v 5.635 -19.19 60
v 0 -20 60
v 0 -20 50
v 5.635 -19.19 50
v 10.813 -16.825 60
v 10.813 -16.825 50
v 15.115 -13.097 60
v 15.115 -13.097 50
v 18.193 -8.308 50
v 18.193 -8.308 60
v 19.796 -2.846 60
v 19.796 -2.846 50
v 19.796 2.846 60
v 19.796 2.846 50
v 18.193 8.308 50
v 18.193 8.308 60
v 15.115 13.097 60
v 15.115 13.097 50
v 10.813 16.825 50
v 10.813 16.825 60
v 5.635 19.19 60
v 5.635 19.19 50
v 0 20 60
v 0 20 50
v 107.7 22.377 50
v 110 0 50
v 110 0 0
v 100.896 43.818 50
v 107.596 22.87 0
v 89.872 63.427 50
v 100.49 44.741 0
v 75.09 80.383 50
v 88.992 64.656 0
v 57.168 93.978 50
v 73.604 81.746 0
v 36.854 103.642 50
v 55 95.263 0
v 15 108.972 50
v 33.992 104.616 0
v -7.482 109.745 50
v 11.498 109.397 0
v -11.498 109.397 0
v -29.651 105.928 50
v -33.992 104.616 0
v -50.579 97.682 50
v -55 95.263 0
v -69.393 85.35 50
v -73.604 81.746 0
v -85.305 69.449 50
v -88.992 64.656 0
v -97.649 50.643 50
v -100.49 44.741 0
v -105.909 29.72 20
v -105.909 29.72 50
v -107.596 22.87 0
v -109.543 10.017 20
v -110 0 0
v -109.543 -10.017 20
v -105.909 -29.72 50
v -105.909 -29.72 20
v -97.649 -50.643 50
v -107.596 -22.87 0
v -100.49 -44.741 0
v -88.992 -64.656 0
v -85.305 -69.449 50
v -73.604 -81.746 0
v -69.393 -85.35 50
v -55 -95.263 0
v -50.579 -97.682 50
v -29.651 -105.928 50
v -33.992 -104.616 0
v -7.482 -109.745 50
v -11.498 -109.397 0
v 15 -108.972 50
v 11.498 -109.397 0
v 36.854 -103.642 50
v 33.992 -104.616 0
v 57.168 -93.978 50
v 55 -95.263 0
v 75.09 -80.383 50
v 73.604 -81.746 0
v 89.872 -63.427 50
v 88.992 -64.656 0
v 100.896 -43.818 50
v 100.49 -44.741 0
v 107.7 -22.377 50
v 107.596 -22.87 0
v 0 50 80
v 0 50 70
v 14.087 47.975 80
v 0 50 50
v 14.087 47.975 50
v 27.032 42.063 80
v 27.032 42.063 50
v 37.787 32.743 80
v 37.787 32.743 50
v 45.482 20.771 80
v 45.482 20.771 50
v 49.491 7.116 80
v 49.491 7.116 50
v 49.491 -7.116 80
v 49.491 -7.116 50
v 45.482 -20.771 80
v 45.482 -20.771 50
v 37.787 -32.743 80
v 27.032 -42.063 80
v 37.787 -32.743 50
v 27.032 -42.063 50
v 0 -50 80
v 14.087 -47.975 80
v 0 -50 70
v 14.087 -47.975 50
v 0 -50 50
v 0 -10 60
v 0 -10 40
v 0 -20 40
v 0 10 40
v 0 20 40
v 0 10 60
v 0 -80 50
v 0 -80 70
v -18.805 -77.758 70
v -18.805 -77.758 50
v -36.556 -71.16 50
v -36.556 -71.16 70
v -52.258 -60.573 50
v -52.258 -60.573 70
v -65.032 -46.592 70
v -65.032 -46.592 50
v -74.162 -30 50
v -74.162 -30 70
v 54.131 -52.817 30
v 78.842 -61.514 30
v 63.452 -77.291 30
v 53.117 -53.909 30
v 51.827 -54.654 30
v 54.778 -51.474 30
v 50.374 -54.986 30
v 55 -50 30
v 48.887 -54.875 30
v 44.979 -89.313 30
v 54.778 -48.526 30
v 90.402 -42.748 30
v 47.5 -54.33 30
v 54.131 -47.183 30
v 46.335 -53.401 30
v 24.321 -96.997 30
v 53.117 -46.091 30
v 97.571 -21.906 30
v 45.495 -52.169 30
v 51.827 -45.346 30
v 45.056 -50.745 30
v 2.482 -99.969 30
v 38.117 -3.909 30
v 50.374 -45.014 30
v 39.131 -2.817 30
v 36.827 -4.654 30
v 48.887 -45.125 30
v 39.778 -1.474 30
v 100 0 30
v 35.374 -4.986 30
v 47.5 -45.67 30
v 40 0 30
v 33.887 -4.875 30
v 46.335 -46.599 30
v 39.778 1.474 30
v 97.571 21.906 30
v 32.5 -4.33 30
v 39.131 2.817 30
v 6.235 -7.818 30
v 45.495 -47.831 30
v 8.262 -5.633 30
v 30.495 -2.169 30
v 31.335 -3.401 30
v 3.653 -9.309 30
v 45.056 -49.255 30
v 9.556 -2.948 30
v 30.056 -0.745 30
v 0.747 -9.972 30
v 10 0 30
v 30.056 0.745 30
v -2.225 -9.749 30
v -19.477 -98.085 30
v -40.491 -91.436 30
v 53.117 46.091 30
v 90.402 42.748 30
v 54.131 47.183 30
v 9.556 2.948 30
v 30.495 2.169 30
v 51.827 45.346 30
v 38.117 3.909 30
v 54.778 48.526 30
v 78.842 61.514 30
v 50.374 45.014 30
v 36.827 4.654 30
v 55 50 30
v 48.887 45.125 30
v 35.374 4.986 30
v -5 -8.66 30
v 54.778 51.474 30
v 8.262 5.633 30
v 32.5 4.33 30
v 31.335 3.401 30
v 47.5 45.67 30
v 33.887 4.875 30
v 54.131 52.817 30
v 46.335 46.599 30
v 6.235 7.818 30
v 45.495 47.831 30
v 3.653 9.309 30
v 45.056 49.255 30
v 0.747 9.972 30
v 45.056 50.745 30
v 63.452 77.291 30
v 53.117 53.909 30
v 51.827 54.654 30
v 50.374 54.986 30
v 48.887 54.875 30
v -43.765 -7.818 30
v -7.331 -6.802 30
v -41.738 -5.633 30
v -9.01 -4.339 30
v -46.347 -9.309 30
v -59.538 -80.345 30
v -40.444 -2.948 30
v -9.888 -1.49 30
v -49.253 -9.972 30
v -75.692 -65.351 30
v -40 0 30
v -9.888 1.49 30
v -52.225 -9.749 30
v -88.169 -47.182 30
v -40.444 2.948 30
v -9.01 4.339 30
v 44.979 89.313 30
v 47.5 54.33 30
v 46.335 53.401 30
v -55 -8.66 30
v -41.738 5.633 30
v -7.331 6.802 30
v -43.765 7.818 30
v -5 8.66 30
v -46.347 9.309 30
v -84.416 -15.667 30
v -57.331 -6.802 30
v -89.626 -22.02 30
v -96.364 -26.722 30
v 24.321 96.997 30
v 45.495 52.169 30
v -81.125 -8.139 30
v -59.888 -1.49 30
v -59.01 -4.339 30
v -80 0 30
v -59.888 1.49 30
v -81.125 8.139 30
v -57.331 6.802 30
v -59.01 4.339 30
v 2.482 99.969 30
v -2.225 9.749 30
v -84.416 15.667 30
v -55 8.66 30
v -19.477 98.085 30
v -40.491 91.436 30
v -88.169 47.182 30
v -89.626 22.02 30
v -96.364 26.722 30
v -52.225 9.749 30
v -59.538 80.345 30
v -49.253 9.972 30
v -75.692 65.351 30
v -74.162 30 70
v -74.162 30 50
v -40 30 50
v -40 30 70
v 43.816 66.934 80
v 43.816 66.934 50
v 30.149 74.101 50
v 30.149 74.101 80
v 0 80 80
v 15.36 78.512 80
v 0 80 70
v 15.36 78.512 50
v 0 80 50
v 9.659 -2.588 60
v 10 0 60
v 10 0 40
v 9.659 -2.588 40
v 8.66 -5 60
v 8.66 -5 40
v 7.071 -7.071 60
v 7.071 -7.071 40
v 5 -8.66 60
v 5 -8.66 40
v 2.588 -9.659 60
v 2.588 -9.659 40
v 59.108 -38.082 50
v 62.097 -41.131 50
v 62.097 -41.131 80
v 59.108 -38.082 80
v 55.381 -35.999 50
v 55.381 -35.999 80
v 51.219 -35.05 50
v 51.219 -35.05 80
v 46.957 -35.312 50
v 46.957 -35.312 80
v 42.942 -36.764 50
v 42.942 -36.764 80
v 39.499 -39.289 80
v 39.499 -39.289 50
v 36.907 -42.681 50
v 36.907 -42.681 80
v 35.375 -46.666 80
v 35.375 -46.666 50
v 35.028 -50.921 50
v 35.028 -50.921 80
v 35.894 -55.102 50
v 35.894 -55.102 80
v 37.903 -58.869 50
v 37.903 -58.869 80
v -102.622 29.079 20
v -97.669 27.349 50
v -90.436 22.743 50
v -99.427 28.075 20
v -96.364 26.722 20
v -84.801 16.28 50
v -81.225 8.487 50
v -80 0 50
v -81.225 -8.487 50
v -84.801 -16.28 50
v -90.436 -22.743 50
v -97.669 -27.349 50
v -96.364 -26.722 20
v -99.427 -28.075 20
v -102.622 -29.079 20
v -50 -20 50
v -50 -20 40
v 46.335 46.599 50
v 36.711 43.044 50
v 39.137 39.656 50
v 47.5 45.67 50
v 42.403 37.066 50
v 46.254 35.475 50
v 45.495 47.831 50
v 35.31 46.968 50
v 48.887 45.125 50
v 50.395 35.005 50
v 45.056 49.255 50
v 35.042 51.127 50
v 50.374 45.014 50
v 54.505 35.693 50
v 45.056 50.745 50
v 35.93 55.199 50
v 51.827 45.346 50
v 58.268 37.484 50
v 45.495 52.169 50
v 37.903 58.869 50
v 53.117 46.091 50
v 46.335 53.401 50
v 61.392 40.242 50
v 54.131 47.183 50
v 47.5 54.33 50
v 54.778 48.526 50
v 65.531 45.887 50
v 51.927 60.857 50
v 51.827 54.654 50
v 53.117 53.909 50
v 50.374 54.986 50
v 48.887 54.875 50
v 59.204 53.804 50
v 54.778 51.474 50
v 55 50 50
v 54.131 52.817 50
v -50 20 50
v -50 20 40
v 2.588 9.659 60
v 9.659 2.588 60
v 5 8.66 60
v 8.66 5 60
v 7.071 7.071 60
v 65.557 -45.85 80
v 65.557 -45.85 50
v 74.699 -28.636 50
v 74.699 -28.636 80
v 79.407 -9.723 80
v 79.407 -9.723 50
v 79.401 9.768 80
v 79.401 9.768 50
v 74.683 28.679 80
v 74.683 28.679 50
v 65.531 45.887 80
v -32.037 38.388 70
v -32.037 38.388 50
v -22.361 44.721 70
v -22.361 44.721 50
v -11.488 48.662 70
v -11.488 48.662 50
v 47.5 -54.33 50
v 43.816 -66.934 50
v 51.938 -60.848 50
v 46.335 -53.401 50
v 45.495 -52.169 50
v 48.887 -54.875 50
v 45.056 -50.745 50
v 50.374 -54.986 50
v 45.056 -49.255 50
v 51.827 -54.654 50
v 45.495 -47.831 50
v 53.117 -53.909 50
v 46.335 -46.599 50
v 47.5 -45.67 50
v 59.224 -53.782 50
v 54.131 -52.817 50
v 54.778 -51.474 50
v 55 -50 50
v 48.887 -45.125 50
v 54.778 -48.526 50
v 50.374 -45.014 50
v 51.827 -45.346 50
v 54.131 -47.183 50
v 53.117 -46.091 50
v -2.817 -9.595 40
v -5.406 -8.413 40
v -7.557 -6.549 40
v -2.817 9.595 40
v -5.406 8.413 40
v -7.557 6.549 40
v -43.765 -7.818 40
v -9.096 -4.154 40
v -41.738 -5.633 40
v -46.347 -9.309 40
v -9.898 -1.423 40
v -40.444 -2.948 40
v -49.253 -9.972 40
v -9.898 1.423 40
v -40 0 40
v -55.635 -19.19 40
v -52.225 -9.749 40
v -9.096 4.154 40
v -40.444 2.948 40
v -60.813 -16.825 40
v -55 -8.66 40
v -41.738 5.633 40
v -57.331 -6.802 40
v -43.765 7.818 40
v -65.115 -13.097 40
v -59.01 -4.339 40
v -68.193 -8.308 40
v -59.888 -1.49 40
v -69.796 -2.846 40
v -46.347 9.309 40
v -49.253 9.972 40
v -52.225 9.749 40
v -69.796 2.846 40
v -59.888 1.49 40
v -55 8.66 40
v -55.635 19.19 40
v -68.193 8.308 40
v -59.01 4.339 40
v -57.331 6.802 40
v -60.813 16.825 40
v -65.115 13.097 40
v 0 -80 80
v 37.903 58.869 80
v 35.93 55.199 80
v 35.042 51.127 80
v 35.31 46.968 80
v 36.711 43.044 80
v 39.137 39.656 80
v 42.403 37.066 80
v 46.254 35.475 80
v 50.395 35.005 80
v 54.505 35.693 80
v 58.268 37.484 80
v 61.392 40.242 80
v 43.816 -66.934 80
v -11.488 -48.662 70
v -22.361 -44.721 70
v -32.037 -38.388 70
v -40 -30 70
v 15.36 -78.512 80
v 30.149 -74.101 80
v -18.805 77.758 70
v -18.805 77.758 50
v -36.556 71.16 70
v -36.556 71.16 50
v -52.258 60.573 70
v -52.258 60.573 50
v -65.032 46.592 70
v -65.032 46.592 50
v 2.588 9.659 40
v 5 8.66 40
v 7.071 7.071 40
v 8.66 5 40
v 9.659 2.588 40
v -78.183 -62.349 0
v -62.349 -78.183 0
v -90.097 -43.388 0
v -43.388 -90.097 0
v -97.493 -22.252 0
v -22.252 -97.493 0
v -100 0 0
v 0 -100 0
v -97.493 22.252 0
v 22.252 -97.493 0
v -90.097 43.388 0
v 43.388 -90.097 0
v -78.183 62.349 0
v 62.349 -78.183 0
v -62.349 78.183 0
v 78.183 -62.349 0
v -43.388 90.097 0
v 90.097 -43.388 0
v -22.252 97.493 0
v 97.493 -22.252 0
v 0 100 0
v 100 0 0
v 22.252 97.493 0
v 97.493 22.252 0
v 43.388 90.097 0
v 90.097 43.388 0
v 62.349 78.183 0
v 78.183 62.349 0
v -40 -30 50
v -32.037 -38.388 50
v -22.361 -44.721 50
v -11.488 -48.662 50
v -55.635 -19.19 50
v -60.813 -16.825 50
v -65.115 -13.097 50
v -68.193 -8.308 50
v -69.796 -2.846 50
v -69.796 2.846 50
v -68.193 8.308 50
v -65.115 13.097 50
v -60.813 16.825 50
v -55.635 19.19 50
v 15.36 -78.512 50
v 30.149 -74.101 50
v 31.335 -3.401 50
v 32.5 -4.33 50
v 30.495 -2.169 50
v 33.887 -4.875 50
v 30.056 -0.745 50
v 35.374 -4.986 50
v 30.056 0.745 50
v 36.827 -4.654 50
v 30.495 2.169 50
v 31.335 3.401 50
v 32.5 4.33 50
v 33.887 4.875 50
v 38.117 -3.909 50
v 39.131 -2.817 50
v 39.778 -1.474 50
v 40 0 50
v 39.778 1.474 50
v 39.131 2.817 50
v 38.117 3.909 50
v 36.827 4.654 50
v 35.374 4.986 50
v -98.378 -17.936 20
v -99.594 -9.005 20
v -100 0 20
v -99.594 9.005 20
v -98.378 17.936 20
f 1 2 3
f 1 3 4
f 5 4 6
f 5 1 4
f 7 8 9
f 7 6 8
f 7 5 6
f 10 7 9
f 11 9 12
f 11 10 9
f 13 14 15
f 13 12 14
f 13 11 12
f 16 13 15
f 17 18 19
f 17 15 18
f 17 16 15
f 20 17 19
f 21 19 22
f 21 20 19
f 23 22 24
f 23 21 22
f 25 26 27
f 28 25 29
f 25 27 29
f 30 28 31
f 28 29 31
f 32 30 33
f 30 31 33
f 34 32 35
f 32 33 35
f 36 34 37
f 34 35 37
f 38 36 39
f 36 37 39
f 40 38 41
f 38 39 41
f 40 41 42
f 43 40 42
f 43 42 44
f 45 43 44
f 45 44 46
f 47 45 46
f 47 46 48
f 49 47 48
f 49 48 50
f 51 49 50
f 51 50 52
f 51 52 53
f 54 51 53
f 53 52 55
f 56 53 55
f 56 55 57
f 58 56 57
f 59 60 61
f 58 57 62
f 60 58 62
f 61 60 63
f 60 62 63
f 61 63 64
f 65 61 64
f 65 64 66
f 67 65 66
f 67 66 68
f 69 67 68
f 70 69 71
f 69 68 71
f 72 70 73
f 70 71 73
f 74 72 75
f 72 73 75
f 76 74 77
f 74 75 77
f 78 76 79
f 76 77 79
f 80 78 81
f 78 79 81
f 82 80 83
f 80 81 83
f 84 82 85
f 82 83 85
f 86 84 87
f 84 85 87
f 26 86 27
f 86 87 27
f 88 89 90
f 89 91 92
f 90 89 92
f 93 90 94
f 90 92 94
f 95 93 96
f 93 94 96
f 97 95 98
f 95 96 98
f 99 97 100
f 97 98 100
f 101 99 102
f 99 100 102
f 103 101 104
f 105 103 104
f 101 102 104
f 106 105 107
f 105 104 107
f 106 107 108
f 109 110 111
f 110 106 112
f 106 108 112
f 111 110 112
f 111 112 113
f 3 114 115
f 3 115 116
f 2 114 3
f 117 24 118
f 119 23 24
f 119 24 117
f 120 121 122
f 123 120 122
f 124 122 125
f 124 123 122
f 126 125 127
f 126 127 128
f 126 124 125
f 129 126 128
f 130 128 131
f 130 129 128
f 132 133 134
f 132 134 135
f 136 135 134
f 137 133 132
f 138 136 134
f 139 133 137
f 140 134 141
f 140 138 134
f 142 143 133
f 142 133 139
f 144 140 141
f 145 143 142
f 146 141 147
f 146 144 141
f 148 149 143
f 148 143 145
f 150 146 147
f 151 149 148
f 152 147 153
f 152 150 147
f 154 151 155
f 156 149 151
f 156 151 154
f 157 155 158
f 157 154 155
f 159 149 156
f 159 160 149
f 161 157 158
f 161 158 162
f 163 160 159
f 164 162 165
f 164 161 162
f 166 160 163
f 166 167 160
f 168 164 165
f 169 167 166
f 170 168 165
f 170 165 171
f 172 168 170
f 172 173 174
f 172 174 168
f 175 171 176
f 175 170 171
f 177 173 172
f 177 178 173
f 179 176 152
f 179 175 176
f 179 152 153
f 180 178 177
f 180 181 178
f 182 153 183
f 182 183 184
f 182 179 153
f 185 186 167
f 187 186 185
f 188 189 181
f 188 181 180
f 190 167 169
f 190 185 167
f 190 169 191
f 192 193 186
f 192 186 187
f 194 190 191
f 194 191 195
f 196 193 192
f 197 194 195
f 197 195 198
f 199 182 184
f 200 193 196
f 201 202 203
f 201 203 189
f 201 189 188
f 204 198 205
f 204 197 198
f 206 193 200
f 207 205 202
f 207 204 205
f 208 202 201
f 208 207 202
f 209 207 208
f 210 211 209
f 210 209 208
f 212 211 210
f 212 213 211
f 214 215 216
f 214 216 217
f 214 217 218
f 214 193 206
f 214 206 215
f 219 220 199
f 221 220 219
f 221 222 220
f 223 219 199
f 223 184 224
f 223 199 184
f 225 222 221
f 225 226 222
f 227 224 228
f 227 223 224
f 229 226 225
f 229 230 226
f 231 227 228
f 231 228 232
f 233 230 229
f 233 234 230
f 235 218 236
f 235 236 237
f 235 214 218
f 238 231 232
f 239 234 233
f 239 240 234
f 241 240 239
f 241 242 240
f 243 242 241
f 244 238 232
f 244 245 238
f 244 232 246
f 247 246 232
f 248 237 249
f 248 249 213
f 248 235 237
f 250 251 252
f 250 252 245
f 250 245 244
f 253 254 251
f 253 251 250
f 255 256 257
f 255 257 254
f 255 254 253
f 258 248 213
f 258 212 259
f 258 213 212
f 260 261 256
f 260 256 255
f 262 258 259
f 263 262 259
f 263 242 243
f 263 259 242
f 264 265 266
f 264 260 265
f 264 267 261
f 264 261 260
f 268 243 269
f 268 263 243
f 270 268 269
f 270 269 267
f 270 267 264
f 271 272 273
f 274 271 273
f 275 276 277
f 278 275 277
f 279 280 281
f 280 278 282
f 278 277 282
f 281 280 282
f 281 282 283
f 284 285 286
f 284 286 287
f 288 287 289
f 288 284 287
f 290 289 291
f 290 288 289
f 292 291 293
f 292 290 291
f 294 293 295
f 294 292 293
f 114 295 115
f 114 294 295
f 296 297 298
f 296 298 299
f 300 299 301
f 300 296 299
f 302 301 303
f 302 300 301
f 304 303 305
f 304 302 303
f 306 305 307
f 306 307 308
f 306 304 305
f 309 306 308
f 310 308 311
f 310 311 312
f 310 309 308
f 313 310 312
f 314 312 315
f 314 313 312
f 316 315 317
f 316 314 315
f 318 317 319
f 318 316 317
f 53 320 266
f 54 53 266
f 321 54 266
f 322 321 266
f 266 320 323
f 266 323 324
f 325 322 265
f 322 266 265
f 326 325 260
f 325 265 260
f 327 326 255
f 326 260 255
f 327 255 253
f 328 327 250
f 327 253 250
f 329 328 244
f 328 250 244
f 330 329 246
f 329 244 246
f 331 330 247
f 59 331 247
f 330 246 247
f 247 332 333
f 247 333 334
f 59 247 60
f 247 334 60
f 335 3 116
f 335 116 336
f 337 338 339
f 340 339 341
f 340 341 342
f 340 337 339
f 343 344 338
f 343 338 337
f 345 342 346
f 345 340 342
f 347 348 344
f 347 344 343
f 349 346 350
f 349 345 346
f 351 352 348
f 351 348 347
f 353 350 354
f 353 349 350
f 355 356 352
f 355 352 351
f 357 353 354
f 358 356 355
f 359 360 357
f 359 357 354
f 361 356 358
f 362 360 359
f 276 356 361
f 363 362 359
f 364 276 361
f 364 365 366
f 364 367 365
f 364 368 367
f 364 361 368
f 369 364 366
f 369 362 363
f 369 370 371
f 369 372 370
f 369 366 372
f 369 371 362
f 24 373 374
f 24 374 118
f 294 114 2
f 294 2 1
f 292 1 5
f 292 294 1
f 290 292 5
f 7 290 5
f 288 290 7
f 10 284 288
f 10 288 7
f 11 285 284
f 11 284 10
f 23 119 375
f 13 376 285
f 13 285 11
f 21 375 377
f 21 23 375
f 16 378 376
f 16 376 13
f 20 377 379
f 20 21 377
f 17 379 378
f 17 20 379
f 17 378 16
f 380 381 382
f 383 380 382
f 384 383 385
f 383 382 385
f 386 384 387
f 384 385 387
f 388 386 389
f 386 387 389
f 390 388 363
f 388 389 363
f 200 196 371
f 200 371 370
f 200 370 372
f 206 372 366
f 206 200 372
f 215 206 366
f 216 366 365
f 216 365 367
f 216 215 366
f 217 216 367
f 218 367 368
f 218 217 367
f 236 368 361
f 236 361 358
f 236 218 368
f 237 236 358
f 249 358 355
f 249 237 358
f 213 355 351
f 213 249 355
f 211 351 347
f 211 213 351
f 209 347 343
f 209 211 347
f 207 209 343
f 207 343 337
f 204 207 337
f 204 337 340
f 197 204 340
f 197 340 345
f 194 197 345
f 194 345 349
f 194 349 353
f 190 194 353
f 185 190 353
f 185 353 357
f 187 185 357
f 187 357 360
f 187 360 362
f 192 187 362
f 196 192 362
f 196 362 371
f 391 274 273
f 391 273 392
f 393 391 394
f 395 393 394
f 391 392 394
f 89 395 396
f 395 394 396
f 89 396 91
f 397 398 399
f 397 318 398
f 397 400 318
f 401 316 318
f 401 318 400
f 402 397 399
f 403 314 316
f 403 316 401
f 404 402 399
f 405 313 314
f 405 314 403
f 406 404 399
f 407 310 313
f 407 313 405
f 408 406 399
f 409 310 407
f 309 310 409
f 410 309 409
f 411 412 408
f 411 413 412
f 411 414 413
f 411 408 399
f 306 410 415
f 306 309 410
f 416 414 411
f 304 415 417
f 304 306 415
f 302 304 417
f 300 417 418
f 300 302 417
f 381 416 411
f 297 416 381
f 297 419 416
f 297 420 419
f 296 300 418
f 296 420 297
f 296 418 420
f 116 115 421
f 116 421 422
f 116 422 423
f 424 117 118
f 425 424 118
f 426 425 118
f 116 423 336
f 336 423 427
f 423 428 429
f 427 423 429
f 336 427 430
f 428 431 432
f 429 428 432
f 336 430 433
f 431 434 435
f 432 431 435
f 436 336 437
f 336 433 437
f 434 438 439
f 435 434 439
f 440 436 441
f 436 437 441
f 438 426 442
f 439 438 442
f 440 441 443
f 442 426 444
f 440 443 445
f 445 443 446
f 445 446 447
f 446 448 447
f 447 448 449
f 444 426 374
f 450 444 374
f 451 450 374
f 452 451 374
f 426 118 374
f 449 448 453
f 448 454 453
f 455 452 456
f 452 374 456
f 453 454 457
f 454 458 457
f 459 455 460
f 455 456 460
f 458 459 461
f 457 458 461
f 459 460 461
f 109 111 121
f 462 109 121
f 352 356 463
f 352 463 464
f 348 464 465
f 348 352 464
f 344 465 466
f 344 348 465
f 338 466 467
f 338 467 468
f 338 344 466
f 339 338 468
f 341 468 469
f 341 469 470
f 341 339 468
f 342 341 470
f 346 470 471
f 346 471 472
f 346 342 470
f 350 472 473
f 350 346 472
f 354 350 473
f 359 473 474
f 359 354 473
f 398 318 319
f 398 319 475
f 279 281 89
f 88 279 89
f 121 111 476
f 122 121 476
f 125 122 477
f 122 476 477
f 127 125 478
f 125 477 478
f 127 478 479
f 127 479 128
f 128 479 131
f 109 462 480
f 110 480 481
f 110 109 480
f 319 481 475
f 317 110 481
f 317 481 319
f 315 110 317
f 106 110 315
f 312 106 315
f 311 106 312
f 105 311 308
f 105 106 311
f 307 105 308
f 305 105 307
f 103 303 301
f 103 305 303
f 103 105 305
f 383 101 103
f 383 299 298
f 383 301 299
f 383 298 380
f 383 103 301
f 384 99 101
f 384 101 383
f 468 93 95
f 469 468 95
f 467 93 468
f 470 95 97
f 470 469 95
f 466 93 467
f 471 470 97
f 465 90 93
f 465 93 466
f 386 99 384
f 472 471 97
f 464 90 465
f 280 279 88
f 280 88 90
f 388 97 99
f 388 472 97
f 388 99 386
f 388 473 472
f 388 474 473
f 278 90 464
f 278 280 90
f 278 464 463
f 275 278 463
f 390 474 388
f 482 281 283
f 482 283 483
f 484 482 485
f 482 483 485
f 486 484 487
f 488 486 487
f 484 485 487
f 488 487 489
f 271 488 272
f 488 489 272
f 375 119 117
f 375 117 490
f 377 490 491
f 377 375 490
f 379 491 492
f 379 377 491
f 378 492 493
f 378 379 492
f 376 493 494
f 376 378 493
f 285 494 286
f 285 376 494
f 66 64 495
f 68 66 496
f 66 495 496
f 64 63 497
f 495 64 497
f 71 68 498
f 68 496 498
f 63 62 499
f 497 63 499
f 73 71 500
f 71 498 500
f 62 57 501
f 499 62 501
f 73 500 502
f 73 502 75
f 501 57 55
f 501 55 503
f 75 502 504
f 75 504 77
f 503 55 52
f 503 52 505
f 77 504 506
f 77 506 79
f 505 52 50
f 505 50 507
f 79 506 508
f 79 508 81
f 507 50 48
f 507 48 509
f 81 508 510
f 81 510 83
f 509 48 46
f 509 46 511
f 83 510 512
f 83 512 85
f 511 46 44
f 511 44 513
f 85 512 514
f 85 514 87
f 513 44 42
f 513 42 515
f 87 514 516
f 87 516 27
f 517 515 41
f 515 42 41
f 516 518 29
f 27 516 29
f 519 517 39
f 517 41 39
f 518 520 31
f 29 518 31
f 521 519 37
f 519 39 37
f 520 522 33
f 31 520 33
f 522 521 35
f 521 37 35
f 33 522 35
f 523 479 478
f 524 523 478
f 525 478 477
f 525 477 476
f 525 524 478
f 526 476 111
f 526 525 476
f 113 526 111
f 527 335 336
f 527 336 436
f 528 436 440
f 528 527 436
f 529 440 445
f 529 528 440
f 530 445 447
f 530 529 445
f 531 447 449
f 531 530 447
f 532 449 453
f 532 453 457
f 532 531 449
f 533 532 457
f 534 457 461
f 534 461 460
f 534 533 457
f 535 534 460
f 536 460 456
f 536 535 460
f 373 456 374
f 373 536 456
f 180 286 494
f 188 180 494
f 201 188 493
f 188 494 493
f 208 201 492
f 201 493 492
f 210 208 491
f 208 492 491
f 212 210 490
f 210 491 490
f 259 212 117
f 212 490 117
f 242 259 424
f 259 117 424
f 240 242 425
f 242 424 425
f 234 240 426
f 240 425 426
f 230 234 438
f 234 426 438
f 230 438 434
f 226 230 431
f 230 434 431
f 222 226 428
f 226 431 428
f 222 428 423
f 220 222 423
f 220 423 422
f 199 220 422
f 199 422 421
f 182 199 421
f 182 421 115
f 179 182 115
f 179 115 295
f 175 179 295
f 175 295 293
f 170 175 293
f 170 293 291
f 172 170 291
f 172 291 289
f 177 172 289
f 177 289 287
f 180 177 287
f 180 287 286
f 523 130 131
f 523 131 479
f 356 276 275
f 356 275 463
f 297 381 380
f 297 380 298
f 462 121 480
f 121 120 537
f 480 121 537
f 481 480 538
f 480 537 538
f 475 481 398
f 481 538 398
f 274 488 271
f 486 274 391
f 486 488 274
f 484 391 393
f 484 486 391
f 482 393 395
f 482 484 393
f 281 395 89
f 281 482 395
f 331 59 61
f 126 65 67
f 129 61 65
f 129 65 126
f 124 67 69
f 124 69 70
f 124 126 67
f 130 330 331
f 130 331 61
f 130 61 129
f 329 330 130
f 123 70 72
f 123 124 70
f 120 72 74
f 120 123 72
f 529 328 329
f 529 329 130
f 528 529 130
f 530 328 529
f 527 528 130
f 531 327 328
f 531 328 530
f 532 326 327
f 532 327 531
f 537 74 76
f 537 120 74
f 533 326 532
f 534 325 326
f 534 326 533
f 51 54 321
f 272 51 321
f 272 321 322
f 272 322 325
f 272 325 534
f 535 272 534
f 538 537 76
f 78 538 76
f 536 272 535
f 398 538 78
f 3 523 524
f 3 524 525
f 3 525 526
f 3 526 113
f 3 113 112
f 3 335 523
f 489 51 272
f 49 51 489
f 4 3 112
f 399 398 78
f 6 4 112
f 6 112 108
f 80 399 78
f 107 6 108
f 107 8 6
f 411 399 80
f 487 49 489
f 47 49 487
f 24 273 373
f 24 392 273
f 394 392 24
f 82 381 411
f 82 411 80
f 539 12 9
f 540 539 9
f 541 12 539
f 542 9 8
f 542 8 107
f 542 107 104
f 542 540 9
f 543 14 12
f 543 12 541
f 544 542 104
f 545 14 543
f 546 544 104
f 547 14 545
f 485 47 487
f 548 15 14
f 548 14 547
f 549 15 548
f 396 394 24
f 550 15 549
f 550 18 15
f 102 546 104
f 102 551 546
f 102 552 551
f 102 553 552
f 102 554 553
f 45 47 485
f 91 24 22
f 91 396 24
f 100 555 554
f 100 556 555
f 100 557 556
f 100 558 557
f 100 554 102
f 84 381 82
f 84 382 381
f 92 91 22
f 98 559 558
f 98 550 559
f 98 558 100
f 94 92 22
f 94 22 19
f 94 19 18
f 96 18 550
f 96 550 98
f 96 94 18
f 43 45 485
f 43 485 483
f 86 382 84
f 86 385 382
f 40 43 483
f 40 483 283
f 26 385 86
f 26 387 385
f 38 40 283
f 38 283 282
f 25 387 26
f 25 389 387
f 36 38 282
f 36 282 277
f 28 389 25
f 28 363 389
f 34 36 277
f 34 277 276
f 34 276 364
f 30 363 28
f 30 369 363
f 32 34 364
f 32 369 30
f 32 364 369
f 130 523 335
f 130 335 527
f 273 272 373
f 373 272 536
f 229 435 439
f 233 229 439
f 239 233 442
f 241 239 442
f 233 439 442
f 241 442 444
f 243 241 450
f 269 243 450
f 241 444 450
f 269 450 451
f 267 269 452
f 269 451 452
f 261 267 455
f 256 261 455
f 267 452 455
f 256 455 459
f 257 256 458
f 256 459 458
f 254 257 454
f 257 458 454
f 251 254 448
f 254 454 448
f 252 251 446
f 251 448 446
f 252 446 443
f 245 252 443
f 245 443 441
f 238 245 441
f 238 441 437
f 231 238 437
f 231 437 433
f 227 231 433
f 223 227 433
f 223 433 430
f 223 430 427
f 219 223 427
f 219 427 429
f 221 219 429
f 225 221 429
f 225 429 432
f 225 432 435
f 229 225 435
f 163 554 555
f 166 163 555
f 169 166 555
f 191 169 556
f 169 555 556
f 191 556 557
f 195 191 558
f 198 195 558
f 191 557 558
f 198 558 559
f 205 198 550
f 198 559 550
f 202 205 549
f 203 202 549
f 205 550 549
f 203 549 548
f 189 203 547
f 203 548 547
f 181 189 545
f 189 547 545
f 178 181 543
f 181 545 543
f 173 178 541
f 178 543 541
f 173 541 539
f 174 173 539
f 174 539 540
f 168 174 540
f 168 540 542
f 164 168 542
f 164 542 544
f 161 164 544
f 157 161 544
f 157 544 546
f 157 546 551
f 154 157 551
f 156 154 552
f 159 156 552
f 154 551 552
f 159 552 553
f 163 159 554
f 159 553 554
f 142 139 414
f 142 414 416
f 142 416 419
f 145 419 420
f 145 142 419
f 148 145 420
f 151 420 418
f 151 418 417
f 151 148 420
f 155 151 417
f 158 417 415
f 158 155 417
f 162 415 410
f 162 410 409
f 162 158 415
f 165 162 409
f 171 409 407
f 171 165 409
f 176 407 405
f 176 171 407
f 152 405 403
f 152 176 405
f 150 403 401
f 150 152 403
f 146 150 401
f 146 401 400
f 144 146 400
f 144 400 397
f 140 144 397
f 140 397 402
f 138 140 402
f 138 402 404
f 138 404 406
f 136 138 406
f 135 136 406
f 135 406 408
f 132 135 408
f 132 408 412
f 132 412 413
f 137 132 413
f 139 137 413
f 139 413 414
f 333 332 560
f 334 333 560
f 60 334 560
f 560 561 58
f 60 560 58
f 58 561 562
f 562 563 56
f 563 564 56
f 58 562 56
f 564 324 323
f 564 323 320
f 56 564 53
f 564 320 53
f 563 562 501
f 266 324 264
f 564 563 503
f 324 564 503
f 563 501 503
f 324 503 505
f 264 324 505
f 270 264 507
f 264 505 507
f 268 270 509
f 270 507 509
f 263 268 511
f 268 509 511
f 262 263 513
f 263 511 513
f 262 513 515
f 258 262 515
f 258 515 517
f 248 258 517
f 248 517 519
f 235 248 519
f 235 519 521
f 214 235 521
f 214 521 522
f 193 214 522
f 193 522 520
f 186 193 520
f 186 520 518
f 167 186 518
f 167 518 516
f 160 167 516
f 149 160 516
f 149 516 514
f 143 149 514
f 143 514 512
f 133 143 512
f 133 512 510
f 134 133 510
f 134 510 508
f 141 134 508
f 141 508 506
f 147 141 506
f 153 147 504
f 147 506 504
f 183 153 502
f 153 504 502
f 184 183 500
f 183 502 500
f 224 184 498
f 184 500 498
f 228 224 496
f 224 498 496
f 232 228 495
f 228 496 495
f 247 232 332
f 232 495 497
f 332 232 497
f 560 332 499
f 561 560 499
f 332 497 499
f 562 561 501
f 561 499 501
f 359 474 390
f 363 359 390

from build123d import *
from build123d.topology import SkipClean

# Parameters (mm, degrees)
SKETCH1_R           = 110
BOSS_EXTRUDE2_DEPTH = 50
SKETCH3_R           = 100
CUT_EXTRUDE1_DEPTH  = 30
SKETCH4_R           = 10
SKETCH4_R_2         = 5
CUT_EXTRUDE2_DEPTH  = 20
SKETCH5_R           = 10
CUT_EXTRUDE3_DEPTH  = 10
BOSS_EXTRUDE3_START = 20
BOSS_EXTRUDE3_DEPTH = 20
CUT_EXTRUDE6_START  = -30
CUT_EXTRUDE6_DEPTH  = 30
BOSS_EXTRUDE4_DEPTH = 20
BOSS_EXTRUDE5_DEPTH = 20
BOSS_EXTRUDE6_DEPTH = 30
CUT_EXTRUDE8_START  = -30
SKETCH11_R          = 5
CUT_EXTRUDE8_DEPTH  = 30
CUT_EXTRUDE9_START  = -50
SKETCH12_R          = 5
CUT_EXTRUDE9_DEPTH  = 50
CUT_EXTRUDE10_START = -50
SKETCH13_R          = 5
CUT_EXTRUDE10_DEPTH = 50


with BuildPart() as part:
    # Sketch1 → Boss-Extrude2 (new body)
    with BuildSketch(Plane.XY):
        Circle(SKETCH1_R)
    extrude(amount=BOSS_EXTRUDE2_DEPTH)

    # Sketch3 → Cut-Extrude1 (cut)
    with BuildSketch(Plane(origin=(0, 0, 0), x_dir=(-1, 0, 0), z_dir=(0, 0, -1))):
        Circle(SKETCH3_R)
    extrude(amount=-CUT_EXTRUDE1_DEPTH, mode=Mode.SUBTRACT)

    # Sketch4 → Cut-Extrude2 (cut)
    with BuildSketch(Plane.XY.offset(50)):
        Circle(SKETCH4_R)
        with Locations((-50, 0)):
            Circle(SKETCH4_R)
        with Locations((35, 0)):
            Circle(SKETCH4_R_2)
    extrude(amount=-CUT_EXTRUDE2_DEPTH, mode=Mode.SUBTRACT)

    # Sketch5 → Cut-Extrude3 (cut)
    with BuildSketch(Plane.XY.offset(50)):
        with BuildLine():
            Line((0, 20), (-50, 20))
            ThreePointArc((-50, 20), (-70, 0), (-50, -20))
            Line((-50, -20), (0, -20))
            ThreePointArc((0, -20), (20, 0), (0, 20))
        make_face()
        with Locations((-50, 0)):
            Circle(SKETCH5_R, mode=Mode.SUBTRACT)
        with BuildLine():
            ThreePointArc((10, 0), (-7.071067812, -7.071067812), (0, 10))
            ThreePointArc((0, 10), (7.071067812, 7.071067812), (10, 0))
        make_face(mode=Mode.SUBTRACT)
    extrude(amount=-CUT_EXTRUDE3_DEPTH, mode=Mode.SUBTRACT)

    # Sketch6 → Boss-Extrude3 (add)
    with BuildSketch(Plane.XY.offset(40).offset(BOSS_EXTRUDE3_START)):
        with BuildLine():
            Line((0, -10), (0, -20))
            ThreePointArc((0, -20), (20, 0), (0, 20))
            Line((0, 20), (0, 10))
            ThreePointArc((0, 10), (7.071067812, 7.071067812), (10, 0))
            ThreePointArc((10, 0), (7.071067812, -7.071067812), (0, -10))
        make_face()
    extrude(amount=-BOSS_EXTRUDE3_DEPTH)

    # Sketch7 → Cut-Extrude6 (cut)
    with BuildSketch(Plane.XY.offset(50).offset(CUT_EXTRUDE6_START)):
        with BuildLine():
            ThreePointArc((-105.909090909, -29.719765524), (-80, 0), (-105.909090909, 29.719765524))
            ThreePointArc((-105.909090909, 29.719765524), (-110, 0), (-105.909090909, -29.719765524))
        make_face()
    extrude(amount=CUT_EXTRUDE6_DEPTH, mode=Mode.SUBTRACT)

    # Sketch8 → Boss-Extrude4 (add)
    with BuildSketch(Plane.XY.offset(50)):
        with BuildLine():
            Line((0, 50), (0, 80))
            ThreePointArc((0, 80), (-44.72135955, 66.332495807), (-74.161984871, 30))
            Line((-74.161984871, 30), (-40, 30))
            ThreePointArc((-40, 30), (-22.360679775, 44.72135955), (0, 50))
        make_face()
    extrude(amount=BOSS_EXTRUDE4_DEPTH)

    # Sketch9 → Boss-Extrude5 (add)
    with BuildSketch(Plane.XY.offset(50)):
        with BuildLine():
            Line((0, -50), (0, -80))
            ThreePointArc((0, -80), (-44.72135955, -66.332495807), (-74.161984871, -30))
            Line((-74.161984871, -30), (-40, -30))
            ThreePointArc((-40, -30), (-22.360679775, -44.72135955), (0, -50))
        make_face()
    extrude(amount=BOSS_EXTRUDE5_DEPTH)

    # Sketch10 → Boss-Extrude6 (add)
    with SkipClean():  # the faces are left unmerged after this step: merging them gives an invalid solid
        with BuildSketch(Plane.XY.offset(50)):
            with BuildLine():
                Line((0, 80), (0, 50))
                ThreePointArc((0, 50), (50, 0), (0, -50))
                Line((0, -50), (0, -80))
                ThreePointArc((0, -80), (80, 0), (0, 80))
            make_face()
        extrude(amount=BOSS_EXTRUDE6_DEPTH)
    add(part.part.scale(1), mode=Mode.REPLACE)  # the faces are merged on a copy

    # Sketch11 → Cut-Extrude8 (cut)
    # profile 1 of 2: a face of its own
    with BuildSketch(Plane.XY.offset(80).offset(CUT_EXTRUDE8_START)):
        with BuildLine():
            ThreePointArc((43.816047842, -66.933952158), (55.693458652, -57.430293951), (65.557268925, -45.850239816))
            Line((65.557268925, -45.850239816), (62.096867875, -41.130626425))
            ThreePointArc((62.096867875, -41.130626425), (41.130626425, -37.903132125), (37.903132125, -58.869373575))
            Line((37.903132125, -58.869373575), (43.816047842, -66.933952158))
        make_face()
        with Locations((50, -50)):
            Circle(SKETCH11_R, mode=Mode.SUBTRACT)
    # profile 2 of 2: a face of its own
    with BuildSketch(Plane.XY.offset(80).offset(CUT_EXTRUDE8_START)):
        with BuildLine():
            Line((43.816047842, 66.933952158), (37.903132125, 58.869373575))
            ThreePointArc((37.903132125, 58.869373575), (40.679714776, 38.247030872), (61.392272116, 40.242124409))
            Line((61.392272116, 40.242124409), (65.531313117, 45.887329418))
            ThreePointArc((65.531313117, 45.887329418), (55.67720736, 57.446049304), (43.816047842, 66.933952158))
        make_face()
        with Locations((50, 50)):
            Circle(SKETCH11_R, mode=Mode.SUBTRACT)
    extrude(amount=CUT_EXTRUDE8_DEPTH, mode=Mode.SUBTRACT)

    # Sketch12 → Cut-Extrude9 (cut)
    with SkipClean():  # the faces are left unmerged after this step: merging them gives an invalid solid
        with BuildSketch(Plane.XY.offset(80).offset(CUT_EXTRUDE9_START)):
            with Locations((50, 50)):
                Circle(SKETCH12_R)
        extrude(amount=CUT_EXTRUDE9_DEPTH, mode=Mode.SUBTRACT)

    # Sketch13 → Cut-Extrude10 (cut)
    with SkipClean():  # the faces are left unmerged after this step: merging them gives an invalid solid
        with BuildSketch(Plane.XY.offset(80).offset(CUT_EXTRUDE10_START)):
            with Locations((50, -50)):
                Circle(SKETCH13_R)
        extrude(amount=CUT_EXTRUDE10_DEPTH, mode=Mode.SUBTRACT)


solid = part.part
